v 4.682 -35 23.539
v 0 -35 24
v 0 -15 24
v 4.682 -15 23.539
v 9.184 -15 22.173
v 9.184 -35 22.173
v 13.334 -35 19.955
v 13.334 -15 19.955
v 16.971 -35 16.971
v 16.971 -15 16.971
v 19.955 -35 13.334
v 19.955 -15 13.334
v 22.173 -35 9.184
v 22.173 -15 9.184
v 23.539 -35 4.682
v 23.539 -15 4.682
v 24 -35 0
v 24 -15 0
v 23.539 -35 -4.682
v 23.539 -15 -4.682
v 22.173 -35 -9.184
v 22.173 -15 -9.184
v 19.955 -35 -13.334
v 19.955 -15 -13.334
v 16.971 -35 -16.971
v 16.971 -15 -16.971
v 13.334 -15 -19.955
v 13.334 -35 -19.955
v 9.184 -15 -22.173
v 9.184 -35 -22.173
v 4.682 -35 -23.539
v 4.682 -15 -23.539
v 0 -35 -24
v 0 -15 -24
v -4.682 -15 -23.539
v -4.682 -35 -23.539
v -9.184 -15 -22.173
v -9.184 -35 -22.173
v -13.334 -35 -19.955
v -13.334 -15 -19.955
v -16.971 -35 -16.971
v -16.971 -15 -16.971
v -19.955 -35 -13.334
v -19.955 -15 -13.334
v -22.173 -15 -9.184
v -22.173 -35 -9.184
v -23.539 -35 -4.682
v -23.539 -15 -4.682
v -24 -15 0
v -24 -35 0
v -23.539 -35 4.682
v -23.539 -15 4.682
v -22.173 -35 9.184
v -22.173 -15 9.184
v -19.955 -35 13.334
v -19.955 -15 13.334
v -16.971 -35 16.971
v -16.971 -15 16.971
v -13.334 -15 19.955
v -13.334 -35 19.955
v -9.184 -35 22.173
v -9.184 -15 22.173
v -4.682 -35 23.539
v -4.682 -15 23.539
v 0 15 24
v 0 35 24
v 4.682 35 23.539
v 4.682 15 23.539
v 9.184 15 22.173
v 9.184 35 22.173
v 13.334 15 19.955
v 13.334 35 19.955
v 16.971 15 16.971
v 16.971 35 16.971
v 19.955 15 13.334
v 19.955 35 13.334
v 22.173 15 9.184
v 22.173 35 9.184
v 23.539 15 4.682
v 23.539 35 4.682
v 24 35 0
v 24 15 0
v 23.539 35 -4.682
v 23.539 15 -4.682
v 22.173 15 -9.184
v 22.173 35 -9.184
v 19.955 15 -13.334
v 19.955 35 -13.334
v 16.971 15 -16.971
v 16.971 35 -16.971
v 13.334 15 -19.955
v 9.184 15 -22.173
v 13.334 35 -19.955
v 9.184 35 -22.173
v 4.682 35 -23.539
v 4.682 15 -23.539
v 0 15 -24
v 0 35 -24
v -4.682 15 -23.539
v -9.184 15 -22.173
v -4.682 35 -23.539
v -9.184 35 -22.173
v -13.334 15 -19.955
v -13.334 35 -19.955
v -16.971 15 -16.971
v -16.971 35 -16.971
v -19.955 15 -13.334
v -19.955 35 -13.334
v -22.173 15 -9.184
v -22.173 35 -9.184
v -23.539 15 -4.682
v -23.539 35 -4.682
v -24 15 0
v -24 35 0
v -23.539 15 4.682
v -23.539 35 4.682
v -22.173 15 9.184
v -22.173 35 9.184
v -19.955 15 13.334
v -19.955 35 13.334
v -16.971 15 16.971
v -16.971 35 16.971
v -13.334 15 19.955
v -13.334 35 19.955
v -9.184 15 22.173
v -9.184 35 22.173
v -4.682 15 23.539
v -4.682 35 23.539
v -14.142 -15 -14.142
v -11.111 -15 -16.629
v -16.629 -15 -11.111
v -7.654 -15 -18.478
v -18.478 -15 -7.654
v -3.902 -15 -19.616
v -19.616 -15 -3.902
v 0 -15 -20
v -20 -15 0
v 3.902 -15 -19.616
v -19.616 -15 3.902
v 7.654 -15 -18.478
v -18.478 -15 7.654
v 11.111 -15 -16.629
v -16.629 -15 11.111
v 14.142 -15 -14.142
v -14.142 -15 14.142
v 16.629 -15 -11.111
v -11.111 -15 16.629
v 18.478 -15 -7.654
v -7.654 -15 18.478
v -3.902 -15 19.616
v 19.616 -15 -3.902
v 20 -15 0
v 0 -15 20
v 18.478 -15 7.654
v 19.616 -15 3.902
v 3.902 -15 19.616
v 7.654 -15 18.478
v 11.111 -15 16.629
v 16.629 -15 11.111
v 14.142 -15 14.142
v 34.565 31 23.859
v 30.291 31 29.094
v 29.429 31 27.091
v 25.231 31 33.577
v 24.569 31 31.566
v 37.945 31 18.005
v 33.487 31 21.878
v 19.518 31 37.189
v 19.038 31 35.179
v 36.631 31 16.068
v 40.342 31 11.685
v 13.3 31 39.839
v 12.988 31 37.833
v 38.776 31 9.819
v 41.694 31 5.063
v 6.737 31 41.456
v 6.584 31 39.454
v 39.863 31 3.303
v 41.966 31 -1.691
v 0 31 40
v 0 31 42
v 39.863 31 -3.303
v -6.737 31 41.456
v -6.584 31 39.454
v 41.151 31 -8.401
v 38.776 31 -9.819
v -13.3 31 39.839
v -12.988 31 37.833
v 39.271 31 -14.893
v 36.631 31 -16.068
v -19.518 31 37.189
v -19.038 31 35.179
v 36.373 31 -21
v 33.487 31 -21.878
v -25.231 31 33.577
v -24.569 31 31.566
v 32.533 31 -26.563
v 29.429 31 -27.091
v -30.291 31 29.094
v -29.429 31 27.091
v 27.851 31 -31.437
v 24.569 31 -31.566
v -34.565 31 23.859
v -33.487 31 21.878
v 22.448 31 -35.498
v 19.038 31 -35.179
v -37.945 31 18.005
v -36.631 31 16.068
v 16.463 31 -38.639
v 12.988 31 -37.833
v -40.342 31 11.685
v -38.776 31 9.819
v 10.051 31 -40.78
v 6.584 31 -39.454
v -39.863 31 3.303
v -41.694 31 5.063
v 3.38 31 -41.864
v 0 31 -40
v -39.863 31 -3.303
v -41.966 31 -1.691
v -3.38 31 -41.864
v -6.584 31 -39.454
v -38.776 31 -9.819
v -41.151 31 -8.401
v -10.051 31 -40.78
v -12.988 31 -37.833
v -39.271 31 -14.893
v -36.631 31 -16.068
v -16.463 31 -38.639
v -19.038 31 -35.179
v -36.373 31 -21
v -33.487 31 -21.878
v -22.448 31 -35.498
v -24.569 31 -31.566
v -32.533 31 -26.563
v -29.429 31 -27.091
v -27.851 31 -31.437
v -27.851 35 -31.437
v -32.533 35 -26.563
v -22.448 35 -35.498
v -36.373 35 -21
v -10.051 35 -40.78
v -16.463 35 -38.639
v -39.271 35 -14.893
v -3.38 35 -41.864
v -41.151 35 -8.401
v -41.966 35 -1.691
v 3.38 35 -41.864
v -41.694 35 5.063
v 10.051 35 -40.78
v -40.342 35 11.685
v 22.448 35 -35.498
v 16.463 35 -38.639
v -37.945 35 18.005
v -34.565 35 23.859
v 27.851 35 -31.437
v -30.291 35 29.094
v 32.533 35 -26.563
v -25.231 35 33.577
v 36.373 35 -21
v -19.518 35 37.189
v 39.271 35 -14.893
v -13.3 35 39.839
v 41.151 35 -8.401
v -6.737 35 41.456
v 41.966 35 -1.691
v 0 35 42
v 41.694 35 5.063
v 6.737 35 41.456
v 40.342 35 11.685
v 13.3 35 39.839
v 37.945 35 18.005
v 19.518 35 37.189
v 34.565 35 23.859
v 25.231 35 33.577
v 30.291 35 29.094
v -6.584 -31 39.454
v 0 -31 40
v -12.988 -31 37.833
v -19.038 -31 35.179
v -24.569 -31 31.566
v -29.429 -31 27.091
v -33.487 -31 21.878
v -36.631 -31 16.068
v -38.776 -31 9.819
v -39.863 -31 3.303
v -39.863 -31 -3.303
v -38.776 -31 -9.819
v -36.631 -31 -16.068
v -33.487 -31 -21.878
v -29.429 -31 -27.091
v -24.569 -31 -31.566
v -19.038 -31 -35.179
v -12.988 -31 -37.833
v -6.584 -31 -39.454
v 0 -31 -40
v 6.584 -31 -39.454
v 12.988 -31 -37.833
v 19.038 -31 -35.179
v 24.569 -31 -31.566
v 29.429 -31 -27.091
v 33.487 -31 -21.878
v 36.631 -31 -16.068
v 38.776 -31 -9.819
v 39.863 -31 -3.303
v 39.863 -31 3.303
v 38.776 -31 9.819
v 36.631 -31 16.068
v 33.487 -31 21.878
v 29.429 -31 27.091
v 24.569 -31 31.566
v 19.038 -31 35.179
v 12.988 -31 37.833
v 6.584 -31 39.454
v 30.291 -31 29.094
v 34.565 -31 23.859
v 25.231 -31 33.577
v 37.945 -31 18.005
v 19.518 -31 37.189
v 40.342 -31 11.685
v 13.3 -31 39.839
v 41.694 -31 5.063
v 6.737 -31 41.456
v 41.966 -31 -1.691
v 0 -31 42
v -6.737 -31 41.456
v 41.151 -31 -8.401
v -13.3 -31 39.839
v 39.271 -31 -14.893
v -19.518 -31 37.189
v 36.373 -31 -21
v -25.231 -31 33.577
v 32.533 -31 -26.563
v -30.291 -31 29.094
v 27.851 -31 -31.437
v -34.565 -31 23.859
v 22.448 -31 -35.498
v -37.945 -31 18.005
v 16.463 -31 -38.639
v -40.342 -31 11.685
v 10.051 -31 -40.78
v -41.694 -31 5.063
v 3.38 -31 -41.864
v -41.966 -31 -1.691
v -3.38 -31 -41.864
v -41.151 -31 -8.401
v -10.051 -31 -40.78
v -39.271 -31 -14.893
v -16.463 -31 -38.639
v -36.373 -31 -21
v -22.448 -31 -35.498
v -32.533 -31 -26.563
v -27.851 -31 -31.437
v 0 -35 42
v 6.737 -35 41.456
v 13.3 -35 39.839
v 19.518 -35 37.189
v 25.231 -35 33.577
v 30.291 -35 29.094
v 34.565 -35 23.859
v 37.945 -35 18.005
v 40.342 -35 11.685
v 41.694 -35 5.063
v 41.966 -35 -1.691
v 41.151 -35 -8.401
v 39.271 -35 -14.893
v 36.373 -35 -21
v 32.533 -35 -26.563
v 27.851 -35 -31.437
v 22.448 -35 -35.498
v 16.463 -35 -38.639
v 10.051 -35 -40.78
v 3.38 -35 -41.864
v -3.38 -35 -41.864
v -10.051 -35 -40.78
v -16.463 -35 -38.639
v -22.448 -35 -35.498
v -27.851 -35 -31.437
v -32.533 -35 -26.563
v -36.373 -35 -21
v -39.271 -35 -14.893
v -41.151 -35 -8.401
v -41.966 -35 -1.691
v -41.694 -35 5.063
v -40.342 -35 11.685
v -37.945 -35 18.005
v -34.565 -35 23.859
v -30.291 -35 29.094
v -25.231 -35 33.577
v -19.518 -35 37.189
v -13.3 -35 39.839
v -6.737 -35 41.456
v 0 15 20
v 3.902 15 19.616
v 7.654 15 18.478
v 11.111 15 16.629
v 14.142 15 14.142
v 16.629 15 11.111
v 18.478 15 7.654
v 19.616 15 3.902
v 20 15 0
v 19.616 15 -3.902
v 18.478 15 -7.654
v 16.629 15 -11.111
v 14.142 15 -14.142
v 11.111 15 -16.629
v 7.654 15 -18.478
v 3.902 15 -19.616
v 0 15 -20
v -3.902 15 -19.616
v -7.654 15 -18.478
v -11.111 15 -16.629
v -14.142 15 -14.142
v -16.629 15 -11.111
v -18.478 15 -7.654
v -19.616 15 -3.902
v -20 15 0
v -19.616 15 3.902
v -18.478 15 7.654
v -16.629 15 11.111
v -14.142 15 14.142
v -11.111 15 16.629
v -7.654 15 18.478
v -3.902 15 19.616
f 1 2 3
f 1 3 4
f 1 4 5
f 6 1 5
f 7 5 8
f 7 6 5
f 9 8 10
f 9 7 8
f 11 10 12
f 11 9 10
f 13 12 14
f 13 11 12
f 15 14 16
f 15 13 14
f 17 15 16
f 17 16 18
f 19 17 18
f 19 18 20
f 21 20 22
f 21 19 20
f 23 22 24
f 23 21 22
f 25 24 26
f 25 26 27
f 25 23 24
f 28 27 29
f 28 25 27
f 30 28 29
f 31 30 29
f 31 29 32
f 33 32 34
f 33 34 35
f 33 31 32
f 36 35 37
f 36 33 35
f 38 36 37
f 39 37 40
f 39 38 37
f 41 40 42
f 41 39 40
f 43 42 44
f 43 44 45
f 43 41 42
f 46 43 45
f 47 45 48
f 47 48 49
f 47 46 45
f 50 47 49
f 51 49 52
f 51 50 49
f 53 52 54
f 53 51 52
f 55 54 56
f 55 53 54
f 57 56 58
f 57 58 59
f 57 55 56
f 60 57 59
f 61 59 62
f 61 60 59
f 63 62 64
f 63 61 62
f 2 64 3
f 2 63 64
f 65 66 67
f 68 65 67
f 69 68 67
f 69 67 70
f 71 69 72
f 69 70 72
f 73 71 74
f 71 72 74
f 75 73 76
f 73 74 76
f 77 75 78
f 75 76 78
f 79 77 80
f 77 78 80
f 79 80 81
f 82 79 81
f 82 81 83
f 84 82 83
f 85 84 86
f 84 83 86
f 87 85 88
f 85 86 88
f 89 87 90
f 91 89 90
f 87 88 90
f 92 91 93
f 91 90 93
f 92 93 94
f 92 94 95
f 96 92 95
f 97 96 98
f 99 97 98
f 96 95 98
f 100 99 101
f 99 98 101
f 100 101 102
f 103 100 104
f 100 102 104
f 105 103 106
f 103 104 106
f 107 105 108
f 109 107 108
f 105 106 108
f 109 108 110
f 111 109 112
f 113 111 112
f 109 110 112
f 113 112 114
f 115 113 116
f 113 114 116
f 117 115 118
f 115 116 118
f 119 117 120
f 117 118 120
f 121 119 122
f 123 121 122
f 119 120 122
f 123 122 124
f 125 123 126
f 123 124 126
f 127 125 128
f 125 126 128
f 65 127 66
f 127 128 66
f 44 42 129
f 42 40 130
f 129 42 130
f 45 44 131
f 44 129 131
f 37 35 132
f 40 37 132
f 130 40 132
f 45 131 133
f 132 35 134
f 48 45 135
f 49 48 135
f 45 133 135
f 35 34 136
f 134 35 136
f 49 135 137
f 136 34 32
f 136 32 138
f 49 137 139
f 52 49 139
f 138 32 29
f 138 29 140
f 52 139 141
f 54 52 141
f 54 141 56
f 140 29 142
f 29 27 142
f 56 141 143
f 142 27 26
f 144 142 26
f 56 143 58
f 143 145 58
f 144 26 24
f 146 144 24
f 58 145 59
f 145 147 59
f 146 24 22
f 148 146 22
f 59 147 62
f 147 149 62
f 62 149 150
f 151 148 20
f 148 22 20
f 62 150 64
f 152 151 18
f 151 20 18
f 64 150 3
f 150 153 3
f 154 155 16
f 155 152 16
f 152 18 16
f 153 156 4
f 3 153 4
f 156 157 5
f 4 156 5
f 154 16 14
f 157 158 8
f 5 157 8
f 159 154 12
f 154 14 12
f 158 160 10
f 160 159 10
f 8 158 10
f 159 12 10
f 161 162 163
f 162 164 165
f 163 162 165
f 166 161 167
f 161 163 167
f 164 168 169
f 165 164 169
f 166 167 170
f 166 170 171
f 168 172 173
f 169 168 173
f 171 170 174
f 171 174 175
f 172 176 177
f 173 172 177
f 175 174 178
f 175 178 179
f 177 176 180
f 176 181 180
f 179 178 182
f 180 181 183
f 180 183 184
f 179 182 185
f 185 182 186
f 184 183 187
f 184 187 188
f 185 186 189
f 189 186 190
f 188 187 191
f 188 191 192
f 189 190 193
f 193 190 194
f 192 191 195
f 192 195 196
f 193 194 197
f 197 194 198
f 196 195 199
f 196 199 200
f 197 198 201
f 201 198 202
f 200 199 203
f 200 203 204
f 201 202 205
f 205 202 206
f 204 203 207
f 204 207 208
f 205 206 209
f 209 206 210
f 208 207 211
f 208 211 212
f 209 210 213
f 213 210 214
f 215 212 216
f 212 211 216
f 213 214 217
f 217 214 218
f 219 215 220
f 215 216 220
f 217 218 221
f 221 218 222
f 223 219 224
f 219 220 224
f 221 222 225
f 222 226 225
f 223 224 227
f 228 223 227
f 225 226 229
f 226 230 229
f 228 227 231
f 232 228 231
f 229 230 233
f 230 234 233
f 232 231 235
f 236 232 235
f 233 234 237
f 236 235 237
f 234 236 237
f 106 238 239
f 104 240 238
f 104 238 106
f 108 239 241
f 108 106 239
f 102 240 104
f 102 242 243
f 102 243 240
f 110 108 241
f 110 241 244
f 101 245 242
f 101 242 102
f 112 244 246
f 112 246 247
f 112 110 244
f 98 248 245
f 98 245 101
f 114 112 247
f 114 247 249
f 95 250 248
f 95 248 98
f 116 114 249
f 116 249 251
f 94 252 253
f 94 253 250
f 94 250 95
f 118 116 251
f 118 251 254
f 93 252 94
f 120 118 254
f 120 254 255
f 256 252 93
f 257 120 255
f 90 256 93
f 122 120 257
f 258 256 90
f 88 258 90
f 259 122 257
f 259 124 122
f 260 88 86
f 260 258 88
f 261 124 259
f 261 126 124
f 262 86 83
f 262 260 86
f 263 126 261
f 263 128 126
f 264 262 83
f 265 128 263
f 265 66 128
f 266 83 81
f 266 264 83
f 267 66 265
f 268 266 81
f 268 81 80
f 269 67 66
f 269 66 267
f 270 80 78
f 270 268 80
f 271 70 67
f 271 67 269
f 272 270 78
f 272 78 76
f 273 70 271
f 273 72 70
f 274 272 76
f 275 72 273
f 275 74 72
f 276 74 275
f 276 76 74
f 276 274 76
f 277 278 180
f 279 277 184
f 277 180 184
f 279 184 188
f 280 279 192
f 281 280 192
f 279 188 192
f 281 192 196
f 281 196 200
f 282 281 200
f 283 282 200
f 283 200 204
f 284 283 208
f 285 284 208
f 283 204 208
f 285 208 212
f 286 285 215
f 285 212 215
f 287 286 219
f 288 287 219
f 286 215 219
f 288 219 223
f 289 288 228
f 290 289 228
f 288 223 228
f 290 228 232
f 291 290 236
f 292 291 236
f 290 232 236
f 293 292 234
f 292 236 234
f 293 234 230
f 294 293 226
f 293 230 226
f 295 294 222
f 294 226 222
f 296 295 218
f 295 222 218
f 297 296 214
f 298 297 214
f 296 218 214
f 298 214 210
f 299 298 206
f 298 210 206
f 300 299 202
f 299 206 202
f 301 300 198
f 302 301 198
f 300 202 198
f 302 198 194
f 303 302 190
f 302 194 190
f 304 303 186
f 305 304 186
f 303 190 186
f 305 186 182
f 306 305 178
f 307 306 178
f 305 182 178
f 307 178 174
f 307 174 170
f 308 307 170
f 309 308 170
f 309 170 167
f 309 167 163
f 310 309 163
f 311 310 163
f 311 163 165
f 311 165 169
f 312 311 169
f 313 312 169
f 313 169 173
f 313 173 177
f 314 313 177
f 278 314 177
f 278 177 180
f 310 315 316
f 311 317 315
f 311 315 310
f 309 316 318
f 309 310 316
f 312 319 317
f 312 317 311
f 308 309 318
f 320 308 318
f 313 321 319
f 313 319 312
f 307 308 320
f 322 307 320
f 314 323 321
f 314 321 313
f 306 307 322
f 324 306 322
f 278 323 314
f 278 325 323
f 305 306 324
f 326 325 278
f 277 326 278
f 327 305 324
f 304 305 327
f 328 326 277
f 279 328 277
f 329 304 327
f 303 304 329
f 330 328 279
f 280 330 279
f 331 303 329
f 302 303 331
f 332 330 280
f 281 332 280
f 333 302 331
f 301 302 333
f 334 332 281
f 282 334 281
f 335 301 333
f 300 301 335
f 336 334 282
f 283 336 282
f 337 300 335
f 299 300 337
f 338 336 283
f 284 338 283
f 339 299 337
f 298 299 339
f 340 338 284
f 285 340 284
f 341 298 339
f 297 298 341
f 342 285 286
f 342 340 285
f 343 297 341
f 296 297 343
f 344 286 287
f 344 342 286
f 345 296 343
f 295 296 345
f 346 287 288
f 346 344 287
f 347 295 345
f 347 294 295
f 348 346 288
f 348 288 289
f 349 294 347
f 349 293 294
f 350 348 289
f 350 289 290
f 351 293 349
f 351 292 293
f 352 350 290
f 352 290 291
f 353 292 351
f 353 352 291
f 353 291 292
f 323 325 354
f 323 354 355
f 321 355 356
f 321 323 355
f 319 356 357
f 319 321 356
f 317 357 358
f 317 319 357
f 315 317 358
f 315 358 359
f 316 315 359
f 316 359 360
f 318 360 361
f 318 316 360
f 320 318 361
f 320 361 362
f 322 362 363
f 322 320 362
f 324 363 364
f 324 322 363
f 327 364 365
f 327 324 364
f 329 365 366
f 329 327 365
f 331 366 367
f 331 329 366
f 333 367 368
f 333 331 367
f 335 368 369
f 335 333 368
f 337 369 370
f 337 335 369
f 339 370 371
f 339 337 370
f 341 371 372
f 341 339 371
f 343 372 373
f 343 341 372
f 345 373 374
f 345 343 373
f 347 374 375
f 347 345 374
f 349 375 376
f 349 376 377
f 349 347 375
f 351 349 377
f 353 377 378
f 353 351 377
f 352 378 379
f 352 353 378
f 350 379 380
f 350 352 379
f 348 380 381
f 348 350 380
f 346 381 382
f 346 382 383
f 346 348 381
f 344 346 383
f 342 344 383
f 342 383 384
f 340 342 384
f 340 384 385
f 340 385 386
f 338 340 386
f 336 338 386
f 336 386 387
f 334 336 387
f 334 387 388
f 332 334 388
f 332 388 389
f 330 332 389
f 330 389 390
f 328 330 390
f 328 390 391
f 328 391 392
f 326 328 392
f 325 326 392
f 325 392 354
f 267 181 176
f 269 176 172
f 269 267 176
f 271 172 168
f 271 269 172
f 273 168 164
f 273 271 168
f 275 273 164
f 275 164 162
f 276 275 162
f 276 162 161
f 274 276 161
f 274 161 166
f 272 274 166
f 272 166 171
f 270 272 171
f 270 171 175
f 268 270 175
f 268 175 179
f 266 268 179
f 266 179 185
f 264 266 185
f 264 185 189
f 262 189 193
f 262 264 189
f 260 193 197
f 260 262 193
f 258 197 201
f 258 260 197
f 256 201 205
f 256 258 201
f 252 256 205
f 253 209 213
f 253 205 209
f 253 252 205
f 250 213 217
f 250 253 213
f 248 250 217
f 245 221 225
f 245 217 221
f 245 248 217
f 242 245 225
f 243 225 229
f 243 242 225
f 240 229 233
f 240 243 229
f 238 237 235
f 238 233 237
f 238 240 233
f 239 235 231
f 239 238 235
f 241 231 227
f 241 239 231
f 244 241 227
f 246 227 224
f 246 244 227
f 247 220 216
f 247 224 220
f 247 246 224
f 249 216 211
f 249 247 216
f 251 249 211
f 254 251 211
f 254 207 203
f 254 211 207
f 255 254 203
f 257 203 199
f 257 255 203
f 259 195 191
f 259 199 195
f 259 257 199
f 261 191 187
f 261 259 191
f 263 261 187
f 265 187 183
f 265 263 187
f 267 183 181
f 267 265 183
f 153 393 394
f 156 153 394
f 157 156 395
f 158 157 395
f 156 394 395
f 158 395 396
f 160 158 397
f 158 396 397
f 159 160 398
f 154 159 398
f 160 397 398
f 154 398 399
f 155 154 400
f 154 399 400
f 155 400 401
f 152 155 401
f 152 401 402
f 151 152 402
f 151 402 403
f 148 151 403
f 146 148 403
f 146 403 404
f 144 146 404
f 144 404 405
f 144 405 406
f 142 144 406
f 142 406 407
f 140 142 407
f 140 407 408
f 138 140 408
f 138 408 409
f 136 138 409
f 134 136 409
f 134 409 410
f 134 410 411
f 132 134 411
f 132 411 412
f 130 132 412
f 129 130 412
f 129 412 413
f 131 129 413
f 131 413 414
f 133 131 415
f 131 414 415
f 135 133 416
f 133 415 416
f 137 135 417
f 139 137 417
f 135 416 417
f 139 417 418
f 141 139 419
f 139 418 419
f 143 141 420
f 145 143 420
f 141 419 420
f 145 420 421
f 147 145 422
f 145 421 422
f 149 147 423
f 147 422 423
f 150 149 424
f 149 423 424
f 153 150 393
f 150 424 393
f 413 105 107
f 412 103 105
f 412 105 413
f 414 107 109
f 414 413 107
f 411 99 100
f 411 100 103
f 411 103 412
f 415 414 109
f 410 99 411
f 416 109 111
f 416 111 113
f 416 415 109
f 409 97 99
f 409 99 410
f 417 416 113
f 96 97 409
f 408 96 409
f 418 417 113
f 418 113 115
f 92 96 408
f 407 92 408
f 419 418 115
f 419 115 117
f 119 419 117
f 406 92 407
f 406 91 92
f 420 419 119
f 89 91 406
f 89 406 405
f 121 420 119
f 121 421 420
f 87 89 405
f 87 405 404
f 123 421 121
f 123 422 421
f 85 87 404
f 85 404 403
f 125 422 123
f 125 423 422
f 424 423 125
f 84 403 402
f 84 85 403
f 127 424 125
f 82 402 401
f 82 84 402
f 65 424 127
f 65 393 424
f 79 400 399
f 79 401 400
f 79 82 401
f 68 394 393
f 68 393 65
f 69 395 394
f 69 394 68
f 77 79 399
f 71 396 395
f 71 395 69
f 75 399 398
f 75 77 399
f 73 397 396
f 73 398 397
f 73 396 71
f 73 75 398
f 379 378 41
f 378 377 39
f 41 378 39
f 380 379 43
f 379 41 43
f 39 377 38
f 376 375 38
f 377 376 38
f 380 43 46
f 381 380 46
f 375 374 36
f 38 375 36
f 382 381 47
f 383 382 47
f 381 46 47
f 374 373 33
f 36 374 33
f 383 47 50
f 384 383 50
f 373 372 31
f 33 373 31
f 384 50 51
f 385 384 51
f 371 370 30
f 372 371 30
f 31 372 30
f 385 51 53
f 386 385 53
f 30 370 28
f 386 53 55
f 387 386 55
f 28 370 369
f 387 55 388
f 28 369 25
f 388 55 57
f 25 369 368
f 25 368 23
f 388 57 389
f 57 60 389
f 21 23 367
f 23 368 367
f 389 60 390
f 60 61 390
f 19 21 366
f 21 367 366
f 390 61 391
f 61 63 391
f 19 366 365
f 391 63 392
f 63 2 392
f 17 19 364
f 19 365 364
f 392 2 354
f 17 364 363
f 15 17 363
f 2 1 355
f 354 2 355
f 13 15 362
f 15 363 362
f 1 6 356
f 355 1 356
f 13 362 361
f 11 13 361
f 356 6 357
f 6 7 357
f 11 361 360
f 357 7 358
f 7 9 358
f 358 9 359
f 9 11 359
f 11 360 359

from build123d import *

# Parameters (mm, degrees)
SKETCH_1_R          = 21
EXTRUDE_1_DEPTH     = 17.5
SKETCH_2_W          = 1
SKETCH_2_H          = 31
SKETCH_3_R          = 12
CUT_EXTRUDE_1_DEPTH = 10
SKETCH_15_R         = 10
CUT_EXTRUDE_3_DEPTH = 39.820097888
SCALE1_SCALE        = 2


with BuildPart() as part:
    # 草图1 → 凸台-拉伸1 (new, symmetric)
    with BuildSketch(Plane(origin=(0, 0, 0), x_dir=(1, 0, 0), z_dir=(0, 1, 0))):
        with Locations(Location((0, 0, 0), (0, 0, 270))):
            Circle(SKETCH_1_R)
    extrude(amount=EXTRUDE_1_DEPTH, both=True)

    # 草图2 → 切除-旋转1 (revolve, cut)
    with BuildSketch(Plane.XY, mode=Mode.PRIVATE) as cut_revolve_1_sk:
        with Locations((20.5, 0)):
            Rectangle(SKETCH_2_W, SKETCH_2_H)
    revolve(cut_revolve_1_sk.sketch.rotate(Axis((0, 17.5, 0), (0, -1, 0)), 90), axis=Axis((0, 17.5, 0), (0, -1, 0)), mode=Mode.SUBTRACT)

    # 草图3 → 切除-拉伸1 (cut)
    with BuildSketch(Plane(origin=(0, 17.5, 0), x_dir=(1, 0, 0), z_dir=(0, 1, 0))):
        with Locations(Location((0, 0, 0), (0, 0, 270))):
            Circle(SKETCH_3_R)
    cut_extrude_1 = extrude(amount=-CUT_EXTRUDE_1_DEPTH, mode=Mode.SUBTRACT)

    # 草图15 → 切除-拉伸3 (cut, through all)
    with BuildSketch(Plane(origin=(0, 7.5, 0), x_dir=(1, 0, 0), z_dir=(0, 1, 0))):
        with Locations(Location((0, 0, 0), (0, 0, 270))):
            Circle(SKETCH_15_R)
    extrude(amount=-CUT_EXTRUDE_3_DEPTH, mode=Mode.SUBTRACT)

    # 镜向1: 切除-拉伸1 across plane
    add(cut_extrude_1.mirror(Plane.ZX), mode=Mode.SUBTRACT)


with BuildPart() as part_1:
    # Scale1: scaled about (0, 0, 0)
    add(part.part.scale(SCALE1_SCALE))


solid = part_1.part
